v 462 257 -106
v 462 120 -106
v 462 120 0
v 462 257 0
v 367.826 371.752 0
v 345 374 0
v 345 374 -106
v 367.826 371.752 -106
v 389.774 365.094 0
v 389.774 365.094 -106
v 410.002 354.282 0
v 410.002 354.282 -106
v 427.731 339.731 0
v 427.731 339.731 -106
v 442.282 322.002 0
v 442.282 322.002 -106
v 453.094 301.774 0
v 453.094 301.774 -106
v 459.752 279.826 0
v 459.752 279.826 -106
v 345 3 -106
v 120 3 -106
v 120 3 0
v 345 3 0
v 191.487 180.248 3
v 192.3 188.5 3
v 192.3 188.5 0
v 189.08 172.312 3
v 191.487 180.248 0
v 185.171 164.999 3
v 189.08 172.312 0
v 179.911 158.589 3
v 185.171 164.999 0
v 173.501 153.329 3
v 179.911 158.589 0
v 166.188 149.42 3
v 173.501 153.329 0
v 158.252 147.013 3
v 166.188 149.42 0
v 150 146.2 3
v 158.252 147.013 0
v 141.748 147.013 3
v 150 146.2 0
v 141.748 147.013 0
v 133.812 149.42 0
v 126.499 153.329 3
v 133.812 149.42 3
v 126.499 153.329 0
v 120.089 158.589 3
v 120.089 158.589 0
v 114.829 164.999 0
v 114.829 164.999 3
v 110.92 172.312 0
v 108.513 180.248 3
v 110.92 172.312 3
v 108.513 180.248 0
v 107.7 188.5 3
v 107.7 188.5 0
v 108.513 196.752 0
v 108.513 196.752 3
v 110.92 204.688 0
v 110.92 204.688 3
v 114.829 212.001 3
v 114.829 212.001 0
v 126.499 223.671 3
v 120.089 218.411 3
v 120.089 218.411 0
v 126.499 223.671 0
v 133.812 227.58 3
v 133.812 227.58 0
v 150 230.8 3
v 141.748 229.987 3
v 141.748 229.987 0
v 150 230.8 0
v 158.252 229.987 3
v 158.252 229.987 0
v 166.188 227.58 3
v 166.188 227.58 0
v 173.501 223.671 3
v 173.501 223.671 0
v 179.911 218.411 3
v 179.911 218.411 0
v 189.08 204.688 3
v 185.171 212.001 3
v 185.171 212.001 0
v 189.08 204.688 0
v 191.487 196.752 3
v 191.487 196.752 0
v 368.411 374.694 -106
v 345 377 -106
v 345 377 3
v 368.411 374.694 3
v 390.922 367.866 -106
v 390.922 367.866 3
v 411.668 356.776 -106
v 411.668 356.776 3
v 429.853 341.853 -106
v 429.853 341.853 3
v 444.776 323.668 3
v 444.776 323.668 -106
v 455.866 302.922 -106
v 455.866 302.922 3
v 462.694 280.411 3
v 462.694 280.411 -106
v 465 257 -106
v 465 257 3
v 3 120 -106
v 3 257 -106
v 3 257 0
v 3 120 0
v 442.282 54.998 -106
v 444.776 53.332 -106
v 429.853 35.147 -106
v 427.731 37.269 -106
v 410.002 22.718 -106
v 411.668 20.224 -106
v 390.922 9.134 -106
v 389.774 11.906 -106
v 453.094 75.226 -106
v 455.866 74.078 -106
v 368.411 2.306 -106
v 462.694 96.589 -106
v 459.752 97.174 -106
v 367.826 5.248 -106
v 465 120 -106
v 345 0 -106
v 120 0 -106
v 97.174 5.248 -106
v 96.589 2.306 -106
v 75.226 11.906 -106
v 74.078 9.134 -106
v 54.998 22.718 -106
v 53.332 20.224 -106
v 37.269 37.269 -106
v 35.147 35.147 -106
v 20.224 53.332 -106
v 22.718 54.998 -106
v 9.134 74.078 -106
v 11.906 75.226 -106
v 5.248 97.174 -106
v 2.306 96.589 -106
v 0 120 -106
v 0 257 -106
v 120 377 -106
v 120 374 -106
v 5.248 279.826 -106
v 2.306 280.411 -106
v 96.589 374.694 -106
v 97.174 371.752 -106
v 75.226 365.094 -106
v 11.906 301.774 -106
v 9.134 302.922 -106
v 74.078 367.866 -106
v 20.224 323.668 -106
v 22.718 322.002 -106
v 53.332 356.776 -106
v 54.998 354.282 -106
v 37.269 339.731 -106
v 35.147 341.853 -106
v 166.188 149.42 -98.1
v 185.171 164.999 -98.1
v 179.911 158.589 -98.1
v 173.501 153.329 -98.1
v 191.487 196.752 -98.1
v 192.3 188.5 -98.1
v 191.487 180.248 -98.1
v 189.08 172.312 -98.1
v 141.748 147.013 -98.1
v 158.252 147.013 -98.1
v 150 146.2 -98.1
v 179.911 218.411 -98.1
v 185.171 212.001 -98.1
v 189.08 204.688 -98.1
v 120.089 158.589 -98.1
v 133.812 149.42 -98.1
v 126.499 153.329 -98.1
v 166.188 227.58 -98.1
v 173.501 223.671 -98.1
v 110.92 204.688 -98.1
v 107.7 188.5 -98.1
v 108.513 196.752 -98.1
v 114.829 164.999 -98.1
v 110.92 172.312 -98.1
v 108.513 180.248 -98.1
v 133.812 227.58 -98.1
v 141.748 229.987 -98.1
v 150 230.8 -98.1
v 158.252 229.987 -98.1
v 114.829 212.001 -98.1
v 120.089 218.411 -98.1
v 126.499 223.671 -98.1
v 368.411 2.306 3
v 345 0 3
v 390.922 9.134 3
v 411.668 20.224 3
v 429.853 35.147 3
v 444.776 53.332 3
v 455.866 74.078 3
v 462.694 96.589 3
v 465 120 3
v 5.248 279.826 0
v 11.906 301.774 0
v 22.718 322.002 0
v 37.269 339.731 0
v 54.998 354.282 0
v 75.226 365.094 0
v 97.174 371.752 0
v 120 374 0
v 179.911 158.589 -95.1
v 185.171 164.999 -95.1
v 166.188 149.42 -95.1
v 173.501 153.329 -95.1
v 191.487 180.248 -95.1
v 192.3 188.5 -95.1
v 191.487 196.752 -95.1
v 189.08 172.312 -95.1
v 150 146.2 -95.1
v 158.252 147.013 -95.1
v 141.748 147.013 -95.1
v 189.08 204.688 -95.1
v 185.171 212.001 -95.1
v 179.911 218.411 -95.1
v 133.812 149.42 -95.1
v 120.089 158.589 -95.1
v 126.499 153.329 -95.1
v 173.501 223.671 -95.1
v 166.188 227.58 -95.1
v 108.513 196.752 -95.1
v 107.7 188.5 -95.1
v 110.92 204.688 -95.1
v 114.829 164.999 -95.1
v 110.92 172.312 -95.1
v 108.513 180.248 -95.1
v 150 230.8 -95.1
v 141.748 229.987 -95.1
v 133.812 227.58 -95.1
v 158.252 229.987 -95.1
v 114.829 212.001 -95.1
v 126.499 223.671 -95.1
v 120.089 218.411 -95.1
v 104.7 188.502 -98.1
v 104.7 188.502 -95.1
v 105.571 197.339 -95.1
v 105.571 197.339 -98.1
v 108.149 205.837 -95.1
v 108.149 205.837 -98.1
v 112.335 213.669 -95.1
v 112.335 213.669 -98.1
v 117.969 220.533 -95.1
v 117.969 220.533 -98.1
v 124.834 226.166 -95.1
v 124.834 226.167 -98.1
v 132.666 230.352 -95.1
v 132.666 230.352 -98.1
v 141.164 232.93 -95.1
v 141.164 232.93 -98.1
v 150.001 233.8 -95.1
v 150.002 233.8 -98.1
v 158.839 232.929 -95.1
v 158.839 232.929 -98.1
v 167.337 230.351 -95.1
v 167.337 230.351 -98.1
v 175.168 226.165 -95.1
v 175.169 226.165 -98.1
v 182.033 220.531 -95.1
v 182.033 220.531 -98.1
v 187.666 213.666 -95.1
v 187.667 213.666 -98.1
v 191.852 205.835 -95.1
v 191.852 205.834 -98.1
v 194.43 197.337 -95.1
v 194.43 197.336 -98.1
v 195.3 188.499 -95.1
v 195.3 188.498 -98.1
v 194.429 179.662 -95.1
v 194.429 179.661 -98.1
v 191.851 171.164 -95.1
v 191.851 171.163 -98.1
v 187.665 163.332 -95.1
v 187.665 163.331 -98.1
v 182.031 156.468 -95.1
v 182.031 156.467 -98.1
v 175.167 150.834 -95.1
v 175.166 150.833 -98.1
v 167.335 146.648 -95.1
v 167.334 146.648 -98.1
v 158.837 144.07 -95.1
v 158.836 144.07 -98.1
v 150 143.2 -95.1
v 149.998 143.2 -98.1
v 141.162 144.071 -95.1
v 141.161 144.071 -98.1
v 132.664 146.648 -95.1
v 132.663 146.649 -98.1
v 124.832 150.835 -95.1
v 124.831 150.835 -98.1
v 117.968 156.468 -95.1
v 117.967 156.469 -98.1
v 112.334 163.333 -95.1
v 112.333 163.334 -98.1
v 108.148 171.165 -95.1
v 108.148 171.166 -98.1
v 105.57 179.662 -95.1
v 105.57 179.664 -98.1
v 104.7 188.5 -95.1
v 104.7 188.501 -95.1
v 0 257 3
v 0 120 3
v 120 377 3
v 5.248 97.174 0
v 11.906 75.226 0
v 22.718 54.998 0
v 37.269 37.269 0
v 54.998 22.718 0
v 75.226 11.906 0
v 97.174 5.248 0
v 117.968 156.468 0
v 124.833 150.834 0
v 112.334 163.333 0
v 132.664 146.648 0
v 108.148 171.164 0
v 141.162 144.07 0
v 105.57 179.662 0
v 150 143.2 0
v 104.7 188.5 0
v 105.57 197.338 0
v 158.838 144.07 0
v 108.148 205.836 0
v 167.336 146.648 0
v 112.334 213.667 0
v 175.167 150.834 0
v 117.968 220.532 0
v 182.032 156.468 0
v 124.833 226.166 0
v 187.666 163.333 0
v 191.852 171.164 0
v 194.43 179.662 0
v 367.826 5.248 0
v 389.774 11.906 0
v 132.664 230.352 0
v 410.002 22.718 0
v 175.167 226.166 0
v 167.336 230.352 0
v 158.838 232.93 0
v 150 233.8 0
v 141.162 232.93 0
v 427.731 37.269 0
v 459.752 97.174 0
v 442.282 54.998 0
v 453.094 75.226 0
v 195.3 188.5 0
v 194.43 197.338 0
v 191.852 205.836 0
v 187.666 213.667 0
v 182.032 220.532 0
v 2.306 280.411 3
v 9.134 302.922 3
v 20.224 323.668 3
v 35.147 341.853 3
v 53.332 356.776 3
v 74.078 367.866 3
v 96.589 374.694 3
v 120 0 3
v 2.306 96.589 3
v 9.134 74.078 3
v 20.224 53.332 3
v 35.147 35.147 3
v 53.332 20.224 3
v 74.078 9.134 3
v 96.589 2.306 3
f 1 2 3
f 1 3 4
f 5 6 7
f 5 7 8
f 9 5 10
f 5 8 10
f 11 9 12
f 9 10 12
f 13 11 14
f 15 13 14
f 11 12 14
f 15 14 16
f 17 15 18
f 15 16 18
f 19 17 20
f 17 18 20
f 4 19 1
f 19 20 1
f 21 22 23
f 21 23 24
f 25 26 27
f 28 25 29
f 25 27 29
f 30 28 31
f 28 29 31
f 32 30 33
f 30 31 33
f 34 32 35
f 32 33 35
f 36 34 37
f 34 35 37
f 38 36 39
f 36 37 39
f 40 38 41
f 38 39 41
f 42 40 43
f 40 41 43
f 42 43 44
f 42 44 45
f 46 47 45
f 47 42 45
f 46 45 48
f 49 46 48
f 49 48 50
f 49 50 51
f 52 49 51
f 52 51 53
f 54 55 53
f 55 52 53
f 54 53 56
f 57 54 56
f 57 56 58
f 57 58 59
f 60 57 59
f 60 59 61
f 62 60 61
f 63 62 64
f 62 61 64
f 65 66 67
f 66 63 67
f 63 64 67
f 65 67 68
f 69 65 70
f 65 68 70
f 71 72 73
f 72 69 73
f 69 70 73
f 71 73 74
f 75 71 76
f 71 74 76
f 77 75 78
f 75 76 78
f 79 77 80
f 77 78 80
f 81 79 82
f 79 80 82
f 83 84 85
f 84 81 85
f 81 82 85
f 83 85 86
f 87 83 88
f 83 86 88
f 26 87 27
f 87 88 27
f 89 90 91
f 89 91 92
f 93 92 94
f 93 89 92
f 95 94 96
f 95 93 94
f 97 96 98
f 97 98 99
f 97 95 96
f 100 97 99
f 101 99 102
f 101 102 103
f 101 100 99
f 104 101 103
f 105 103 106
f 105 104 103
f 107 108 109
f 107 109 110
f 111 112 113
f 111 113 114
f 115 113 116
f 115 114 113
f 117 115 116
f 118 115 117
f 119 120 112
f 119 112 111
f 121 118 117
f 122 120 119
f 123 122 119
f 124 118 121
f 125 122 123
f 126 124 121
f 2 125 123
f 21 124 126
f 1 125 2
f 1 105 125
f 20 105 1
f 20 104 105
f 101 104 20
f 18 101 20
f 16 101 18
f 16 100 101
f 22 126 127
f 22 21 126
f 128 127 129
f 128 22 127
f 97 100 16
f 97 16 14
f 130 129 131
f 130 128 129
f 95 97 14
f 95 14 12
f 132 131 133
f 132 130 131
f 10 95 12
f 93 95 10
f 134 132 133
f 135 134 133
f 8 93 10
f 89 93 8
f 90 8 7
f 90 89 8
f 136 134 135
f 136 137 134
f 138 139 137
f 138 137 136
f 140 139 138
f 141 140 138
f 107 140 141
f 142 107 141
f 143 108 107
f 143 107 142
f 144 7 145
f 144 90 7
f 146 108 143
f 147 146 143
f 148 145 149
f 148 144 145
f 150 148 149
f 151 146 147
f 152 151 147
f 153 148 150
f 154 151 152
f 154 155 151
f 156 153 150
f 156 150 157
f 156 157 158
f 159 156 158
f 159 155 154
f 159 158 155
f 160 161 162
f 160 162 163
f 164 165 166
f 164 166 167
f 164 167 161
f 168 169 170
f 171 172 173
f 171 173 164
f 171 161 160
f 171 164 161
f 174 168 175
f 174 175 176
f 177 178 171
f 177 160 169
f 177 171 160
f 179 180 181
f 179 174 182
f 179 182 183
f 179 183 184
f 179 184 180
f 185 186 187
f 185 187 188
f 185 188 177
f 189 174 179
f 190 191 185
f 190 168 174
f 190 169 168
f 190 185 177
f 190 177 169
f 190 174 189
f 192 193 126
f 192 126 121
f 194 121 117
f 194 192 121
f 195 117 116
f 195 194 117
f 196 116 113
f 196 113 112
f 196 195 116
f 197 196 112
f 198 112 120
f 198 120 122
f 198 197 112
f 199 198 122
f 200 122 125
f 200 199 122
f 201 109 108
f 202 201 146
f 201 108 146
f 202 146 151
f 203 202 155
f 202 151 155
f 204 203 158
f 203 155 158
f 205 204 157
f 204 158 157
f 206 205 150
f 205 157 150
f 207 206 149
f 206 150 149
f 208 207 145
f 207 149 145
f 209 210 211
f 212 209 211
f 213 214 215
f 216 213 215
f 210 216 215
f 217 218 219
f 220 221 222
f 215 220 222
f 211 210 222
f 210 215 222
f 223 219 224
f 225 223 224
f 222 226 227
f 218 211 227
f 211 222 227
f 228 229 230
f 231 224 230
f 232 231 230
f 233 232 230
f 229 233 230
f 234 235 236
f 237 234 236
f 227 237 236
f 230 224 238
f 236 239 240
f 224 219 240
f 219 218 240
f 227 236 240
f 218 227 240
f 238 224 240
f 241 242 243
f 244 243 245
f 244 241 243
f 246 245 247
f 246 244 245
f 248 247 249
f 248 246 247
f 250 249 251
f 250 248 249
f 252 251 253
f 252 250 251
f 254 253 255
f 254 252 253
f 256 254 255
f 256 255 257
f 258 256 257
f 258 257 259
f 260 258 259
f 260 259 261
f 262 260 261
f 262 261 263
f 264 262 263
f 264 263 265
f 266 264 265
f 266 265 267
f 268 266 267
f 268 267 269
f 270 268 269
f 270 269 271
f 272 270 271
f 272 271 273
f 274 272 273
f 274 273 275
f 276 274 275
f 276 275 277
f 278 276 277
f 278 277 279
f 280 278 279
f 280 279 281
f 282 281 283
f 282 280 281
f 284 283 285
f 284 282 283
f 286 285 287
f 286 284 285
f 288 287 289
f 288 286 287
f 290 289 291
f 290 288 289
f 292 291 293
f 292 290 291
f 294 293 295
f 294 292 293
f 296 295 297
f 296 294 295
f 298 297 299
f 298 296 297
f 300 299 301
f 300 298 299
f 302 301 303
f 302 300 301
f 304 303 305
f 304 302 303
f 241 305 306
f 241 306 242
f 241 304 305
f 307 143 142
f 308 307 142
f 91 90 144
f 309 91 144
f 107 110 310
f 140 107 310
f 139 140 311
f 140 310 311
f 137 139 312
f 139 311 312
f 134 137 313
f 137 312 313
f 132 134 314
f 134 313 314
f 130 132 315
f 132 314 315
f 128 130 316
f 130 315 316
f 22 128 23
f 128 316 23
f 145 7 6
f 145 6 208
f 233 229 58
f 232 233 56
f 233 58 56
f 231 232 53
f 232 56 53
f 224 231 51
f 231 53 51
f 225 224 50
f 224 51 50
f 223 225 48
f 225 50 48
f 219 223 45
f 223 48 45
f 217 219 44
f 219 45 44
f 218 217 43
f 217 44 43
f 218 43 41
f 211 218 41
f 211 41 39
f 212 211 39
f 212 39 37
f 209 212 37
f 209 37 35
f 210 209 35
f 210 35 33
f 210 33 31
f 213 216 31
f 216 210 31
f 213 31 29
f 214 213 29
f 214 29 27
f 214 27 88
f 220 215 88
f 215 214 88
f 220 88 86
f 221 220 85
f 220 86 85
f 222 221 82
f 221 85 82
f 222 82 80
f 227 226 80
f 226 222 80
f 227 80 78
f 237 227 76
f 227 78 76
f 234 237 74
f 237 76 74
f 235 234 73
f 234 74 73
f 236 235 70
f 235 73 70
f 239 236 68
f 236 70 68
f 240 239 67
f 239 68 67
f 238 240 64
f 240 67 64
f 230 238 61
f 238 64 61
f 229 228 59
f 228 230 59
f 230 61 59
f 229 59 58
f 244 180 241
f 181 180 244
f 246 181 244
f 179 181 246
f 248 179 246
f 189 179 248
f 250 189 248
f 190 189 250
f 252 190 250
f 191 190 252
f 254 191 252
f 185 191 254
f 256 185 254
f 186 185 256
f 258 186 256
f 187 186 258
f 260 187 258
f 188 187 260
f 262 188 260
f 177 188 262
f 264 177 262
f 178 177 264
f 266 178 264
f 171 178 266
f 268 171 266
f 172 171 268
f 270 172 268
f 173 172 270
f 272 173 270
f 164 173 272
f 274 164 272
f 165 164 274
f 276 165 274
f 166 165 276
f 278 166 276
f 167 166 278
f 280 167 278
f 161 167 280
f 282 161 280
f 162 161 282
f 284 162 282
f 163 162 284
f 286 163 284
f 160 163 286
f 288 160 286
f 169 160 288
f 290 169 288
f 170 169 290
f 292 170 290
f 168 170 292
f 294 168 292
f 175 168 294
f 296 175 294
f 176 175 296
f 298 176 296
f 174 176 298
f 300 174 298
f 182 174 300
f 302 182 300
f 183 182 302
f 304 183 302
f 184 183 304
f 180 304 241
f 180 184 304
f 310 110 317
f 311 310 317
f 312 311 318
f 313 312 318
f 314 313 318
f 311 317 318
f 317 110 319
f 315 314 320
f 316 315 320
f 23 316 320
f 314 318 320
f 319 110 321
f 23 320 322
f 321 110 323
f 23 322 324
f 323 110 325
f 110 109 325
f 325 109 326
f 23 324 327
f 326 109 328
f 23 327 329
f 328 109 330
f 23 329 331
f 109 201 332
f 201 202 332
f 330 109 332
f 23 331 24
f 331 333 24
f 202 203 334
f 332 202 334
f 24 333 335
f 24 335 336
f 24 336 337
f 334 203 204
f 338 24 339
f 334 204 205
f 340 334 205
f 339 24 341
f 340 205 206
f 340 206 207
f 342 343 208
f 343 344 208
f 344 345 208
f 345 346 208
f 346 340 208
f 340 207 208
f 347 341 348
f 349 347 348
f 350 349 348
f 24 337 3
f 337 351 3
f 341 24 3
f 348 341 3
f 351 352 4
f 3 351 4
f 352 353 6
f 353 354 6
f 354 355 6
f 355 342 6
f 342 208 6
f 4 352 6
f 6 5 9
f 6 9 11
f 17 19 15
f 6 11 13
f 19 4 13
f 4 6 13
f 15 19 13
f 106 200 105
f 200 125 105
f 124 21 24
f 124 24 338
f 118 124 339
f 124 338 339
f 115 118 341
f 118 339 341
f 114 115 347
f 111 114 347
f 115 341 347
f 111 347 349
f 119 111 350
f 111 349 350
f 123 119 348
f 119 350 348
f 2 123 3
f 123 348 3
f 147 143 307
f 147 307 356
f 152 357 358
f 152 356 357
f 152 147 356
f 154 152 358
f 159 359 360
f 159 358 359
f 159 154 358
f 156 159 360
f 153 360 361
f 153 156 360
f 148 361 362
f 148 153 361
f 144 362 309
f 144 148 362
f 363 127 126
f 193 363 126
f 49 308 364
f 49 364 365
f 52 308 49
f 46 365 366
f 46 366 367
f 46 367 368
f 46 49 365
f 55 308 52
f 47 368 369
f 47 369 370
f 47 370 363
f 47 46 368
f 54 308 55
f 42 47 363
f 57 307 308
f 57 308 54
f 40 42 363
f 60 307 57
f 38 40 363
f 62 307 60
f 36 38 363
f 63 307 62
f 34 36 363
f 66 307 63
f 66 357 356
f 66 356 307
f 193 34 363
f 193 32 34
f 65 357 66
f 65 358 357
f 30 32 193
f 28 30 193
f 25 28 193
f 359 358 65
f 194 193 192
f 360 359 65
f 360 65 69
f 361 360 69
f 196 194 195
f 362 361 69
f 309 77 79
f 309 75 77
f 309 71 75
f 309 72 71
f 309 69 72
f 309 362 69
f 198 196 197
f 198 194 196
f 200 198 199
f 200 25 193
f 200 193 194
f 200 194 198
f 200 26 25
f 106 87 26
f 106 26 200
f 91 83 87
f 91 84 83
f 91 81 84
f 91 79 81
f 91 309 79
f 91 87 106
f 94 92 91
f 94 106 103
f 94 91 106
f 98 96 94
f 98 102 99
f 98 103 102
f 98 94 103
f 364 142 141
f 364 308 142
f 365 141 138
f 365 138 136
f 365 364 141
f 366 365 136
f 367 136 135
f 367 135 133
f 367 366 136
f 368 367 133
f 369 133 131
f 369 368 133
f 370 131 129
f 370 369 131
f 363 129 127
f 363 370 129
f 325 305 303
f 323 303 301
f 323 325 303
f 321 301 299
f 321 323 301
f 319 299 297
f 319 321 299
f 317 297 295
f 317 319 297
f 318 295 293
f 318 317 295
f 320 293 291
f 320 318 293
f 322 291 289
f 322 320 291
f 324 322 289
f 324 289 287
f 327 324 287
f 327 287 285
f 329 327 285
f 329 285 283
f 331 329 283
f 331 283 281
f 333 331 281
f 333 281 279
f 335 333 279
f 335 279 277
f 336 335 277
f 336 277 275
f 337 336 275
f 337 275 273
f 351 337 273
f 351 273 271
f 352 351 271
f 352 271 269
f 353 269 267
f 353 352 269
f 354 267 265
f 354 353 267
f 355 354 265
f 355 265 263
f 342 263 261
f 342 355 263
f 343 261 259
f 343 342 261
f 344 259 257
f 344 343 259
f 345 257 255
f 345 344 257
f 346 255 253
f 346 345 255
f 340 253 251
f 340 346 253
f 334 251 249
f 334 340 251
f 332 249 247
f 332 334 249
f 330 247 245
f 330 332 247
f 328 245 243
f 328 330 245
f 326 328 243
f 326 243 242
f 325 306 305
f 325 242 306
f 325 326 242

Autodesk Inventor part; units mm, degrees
ref_plane "YZ Plane" through (0, 0, 0) normal (1, 0, 0) x (0, 1, 0)
ref_plane "XZ Plane" through (0, 0, 0) normal (0, 1, 0) x (-1, 0, 0)
ref_plane "XY Plane" through (0, 0, 0) normal (0, 0, 1) x (1, 0, 0)
sketch "Sketch1" plane through (0, 0, 0) normal (0, 0, 1) x (1, 0, 0)
  line L0 (0, 0) -> (465, 0)
  line L1 (465, 0) -> (465, 377)
  line L2 (465, 377) -> (0, 377)
  line L3 (0, 377) -> (0, 0)
  line L4 (0, 188.5) -> (465, 188.5) construction
  line L5 (150, 478.4047) -> (150, -123.5436) construction
  circle A0 centre (150, 188.5) radius 42.3
  dimension "d0" = 465
  dimension "d1" = 377
  dimension "d7" = 315
  dimension "d8" = 84.6
extrude "Extrusion1" add sketch "Sketch1" along normal blind 3
sketch "Sketch2" plane through (0, 0, 0) normal (0, 0, -1) x (-1, 0, 0)
  circle A0 centre (-150, 188.5) radius 42.3 projected
  line L0 (-465, 377) -> (0, 377)
  line L1 (0, 377) -> (0, 0)
  line L2 (0, 0) -> (-465, 0)
  line L3 (-465, 0) -> (-465, 377)
extrude "Extrusion2" add sketch "Sketch2" along normal blind 106
sketch "Sketch3" plane through (0, 0, -106) normal (0, 0, -1) x (-1, 0, 0)
  circle A0 centre (-150, 188.5) radius 42.3 projected
  circle A1 centre (-150, 188.5) radius 50.9763
extrude "Extrusion3" add sketch "Sketch3" against normal blind 10.9 contours A0
fillet "Fillet1" radius 120 4 edges at (465, 0, -51.5) (465, 377, -51.5) (0, 0, -51.5) (0, 377, -51.5)
sketch "Sketch4" plane through (0, 0, 3) normal (0, 0, 1) x (1, 0, 0)
  arc A0 (120, 377) -> (0, 257) centre (120, 257) ccw projected
  line L0 (0, 257) -> (0, 120) projected
  arc A1 (0, 120) -> (120, 0) centre (120, 120) ccw projected
  line L1 (120, 0) -> (345, 0) projected
  arc A2 (345, 0) -> (465, 120) centre (345, 120) ccw projected
  line L2 (465, 120) -> (465, 257) projected
  arc A3 (465, 257) -> (345, 377) centre (345, 257) ccw projected
  line L3 (345, 377) -> (120, 377) projected
  circle A4 centre (150, 188.5) radius 42.3 projected
  point P0 (0, 0)
shell "Shell1" thickness 3 removed faces 1 at (195, 125.6667, -106)
properties part number "Pseudo-Guitar"
